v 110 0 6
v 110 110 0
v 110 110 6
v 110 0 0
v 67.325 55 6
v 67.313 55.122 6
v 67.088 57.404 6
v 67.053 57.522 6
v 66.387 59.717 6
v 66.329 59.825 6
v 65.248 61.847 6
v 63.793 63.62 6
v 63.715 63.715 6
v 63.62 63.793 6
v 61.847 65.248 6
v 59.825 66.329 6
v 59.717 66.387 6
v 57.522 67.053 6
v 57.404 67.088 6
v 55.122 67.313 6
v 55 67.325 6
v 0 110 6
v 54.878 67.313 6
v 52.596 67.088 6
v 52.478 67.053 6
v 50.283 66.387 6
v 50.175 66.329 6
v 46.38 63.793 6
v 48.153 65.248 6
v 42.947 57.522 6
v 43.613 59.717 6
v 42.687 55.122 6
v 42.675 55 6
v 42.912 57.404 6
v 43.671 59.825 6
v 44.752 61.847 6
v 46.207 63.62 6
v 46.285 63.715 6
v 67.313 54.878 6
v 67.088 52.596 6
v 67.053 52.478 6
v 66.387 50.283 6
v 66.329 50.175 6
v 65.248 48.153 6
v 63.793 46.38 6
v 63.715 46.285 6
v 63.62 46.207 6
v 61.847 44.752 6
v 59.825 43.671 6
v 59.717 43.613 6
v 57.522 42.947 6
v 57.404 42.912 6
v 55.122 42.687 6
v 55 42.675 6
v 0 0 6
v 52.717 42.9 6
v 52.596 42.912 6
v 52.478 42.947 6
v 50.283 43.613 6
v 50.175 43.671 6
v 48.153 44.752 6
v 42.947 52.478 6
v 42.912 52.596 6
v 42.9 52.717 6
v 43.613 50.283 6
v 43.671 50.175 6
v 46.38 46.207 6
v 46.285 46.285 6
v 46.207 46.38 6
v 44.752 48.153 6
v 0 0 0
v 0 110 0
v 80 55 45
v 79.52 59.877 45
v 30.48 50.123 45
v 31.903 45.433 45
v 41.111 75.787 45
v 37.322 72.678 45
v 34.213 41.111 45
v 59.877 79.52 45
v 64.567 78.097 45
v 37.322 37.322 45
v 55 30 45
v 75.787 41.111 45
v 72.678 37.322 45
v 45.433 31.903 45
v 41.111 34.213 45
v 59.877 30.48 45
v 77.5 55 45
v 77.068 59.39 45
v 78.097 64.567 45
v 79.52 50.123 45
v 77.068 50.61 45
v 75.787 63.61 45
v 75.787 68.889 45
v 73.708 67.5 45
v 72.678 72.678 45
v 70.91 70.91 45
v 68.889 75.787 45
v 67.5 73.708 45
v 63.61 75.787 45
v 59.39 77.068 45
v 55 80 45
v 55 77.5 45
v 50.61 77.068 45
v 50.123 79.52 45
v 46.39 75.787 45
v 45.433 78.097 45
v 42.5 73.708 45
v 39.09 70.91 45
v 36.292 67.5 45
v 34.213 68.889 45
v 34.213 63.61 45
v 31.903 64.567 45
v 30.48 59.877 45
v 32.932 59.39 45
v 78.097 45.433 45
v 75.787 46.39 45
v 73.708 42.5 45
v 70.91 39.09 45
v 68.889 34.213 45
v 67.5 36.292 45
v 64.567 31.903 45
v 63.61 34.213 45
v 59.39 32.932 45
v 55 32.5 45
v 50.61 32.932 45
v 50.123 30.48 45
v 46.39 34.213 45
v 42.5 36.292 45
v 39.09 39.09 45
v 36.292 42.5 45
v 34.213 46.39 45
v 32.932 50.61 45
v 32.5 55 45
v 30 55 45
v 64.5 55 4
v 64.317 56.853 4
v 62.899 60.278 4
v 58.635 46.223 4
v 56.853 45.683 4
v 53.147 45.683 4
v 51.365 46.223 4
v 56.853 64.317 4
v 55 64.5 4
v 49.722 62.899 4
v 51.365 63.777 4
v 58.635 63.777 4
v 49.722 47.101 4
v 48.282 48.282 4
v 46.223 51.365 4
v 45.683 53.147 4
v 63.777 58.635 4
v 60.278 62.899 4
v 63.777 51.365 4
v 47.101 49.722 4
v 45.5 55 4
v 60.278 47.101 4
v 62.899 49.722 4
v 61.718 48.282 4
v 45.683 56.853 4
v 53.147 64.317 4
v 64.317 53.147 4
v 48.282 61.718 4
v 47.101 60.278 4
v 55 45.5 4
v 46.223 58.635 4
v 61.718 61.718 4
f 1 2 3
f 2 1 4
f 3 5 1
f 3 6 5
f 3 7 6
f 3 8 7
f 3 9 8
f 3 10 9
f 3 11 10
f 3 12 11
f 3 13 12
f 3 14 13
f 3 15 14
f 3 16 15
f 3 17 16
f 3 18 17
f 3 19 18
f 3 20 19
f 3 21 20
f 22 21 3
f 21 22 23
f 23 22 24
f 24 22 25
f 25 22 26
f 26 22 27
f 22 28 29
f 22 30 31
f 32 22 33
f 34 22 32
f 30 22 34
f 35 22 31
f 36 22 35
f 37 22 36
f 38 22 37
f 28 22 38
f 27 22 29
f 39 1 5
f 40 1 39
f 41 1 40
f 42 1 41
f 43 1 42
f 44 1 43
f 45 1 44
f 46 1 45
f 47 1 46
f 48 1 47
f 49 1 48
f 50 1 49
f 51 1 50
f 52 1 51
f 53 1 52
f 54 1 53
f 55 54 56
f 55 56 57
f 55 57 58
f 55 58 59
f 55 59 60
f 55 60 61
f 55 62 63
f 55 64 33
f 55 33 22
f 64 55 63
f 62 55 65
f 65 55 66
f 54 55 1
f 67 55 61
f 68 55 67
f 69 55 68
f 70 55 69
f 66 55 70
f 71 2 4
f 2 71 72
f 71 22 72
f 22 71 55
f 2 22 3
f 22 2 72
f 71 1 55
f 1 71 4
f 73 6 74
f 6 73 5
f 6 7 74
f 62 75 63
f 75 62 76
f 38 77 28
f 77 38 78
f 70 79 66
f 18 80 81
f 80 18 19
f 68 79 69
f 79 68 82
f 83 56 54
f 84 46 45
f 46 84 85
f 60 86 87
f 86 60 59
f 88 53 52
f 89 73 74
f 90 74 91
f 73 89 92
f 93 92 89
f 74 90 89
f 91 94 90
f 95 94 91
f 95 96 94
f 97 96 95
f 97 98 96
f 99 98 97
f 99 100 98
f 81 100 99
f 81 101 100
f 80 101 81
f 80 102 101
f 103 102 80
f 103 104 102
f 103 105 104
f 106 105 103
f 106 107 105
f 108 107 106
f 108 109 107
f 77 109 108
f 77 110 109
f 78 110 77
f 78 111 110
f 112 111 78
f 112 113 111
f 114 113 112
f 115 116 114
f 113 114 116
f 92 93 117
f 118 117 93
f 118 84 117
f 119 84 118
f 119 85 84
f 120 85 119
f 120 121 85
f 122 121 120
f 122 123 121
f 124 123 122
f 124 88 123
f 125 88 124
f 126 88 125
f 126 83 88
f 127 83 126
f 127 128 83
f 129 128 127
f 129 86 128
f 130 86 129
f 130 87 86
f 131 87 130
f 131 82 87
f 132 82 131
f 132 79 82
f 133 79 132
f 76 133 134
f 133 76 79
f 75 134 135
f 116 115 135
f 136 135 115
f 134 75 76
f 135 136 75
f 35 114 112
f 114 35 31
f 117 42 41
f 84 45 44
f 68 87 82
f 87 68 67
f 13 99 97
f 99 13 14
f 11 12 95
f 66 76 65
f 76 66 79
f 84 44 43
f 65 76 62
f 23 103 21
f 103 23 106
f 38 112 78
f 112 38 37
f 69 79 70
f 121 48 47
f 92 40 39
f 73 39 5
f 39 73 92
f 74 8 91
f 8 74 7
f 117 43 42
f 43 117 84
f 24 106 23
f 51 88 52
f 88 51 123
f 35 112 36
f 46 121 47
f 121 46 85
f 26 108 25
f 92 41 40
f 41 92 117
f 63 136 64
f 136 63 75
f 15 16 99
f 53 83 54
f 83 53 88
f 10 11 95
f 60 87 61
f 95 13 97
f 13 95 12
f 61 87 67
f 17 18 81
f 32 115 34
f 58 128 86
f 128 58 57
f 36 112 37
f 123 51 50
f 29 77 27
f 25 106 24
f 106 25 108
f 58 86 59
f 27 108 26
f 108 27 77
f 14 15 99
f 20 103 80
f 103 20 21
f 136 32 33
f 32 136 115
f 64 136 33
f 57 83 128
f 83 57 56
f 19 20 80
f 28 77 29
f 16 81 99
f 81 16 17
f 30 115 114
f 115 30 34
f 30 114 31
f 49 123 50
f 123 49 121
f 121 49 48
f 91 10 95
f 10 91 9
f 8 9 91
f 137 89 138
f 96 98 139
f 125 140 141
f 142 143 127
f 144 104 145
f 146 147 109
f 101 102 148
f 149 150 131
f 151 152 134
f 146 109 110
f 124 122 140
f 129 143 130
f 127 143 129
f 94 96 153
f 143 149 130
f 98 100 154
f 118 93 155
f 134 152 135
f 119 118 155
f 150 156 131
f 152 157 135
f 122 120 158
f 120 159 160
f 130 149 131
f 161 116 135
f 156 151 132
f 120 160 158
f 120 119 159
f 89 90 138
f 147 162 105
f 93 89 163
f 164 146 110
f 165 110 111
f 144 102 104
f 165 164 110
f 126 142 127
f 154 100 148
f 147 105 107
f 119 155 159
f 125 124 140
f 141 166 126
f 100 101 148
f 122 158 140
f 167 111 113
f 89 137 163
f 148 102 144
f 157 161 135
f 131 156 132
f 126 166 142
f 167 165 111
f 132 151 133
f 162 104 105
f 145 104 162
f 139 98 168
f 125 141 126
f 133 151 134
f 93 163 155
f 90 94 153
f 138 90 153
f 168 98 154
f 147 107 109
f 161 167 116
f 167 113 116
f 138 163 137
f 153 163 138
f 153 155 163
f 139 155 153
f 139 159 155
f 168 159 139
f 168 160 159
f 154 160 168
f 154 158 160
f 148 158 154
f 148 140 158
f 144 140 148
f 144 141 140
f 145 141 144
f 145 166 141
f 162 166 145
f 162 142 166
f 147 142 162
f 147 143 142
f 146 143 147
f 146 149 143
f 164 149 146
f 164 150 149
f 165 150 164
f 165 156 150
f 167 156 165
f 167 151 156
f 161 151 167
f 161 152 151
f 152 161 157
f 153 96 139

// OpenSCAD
$fn = 32;

// ----------------------------------------------------------------------
// Hopper: funnel with square flange
// ----------------------------------------------------------------------

// --- parameters (mm) ---
fl = 110;                 // flange side, X and Y
fl_t = 6;                 // flange thickness
cone_h = 40;              // cone height above the flange
top_d = 50;               // cone mouth diameter
bot_d = 24;               // cone spout diameter
wall = 2.5;               // cone wall thickness

bore_d = bot_d - 2 * wall;  // spout bore diameter
total_h = fl_t + cone_h - 1;  // overall height

difference() {
  union() {
    cube([fl, fl, fl_t]);
    translate([fl / 2, fl / 2, fl_t - 1])
      cylinder(h = cone_h, d1 = bot_d, d2 = top_d);
  }
  translate([fl / 2, fl / 2, fl_t - 2])
    cylinder(h = cone_h + 1, d1 = bore_d, d2 = top_d - 2 * wall);
}
